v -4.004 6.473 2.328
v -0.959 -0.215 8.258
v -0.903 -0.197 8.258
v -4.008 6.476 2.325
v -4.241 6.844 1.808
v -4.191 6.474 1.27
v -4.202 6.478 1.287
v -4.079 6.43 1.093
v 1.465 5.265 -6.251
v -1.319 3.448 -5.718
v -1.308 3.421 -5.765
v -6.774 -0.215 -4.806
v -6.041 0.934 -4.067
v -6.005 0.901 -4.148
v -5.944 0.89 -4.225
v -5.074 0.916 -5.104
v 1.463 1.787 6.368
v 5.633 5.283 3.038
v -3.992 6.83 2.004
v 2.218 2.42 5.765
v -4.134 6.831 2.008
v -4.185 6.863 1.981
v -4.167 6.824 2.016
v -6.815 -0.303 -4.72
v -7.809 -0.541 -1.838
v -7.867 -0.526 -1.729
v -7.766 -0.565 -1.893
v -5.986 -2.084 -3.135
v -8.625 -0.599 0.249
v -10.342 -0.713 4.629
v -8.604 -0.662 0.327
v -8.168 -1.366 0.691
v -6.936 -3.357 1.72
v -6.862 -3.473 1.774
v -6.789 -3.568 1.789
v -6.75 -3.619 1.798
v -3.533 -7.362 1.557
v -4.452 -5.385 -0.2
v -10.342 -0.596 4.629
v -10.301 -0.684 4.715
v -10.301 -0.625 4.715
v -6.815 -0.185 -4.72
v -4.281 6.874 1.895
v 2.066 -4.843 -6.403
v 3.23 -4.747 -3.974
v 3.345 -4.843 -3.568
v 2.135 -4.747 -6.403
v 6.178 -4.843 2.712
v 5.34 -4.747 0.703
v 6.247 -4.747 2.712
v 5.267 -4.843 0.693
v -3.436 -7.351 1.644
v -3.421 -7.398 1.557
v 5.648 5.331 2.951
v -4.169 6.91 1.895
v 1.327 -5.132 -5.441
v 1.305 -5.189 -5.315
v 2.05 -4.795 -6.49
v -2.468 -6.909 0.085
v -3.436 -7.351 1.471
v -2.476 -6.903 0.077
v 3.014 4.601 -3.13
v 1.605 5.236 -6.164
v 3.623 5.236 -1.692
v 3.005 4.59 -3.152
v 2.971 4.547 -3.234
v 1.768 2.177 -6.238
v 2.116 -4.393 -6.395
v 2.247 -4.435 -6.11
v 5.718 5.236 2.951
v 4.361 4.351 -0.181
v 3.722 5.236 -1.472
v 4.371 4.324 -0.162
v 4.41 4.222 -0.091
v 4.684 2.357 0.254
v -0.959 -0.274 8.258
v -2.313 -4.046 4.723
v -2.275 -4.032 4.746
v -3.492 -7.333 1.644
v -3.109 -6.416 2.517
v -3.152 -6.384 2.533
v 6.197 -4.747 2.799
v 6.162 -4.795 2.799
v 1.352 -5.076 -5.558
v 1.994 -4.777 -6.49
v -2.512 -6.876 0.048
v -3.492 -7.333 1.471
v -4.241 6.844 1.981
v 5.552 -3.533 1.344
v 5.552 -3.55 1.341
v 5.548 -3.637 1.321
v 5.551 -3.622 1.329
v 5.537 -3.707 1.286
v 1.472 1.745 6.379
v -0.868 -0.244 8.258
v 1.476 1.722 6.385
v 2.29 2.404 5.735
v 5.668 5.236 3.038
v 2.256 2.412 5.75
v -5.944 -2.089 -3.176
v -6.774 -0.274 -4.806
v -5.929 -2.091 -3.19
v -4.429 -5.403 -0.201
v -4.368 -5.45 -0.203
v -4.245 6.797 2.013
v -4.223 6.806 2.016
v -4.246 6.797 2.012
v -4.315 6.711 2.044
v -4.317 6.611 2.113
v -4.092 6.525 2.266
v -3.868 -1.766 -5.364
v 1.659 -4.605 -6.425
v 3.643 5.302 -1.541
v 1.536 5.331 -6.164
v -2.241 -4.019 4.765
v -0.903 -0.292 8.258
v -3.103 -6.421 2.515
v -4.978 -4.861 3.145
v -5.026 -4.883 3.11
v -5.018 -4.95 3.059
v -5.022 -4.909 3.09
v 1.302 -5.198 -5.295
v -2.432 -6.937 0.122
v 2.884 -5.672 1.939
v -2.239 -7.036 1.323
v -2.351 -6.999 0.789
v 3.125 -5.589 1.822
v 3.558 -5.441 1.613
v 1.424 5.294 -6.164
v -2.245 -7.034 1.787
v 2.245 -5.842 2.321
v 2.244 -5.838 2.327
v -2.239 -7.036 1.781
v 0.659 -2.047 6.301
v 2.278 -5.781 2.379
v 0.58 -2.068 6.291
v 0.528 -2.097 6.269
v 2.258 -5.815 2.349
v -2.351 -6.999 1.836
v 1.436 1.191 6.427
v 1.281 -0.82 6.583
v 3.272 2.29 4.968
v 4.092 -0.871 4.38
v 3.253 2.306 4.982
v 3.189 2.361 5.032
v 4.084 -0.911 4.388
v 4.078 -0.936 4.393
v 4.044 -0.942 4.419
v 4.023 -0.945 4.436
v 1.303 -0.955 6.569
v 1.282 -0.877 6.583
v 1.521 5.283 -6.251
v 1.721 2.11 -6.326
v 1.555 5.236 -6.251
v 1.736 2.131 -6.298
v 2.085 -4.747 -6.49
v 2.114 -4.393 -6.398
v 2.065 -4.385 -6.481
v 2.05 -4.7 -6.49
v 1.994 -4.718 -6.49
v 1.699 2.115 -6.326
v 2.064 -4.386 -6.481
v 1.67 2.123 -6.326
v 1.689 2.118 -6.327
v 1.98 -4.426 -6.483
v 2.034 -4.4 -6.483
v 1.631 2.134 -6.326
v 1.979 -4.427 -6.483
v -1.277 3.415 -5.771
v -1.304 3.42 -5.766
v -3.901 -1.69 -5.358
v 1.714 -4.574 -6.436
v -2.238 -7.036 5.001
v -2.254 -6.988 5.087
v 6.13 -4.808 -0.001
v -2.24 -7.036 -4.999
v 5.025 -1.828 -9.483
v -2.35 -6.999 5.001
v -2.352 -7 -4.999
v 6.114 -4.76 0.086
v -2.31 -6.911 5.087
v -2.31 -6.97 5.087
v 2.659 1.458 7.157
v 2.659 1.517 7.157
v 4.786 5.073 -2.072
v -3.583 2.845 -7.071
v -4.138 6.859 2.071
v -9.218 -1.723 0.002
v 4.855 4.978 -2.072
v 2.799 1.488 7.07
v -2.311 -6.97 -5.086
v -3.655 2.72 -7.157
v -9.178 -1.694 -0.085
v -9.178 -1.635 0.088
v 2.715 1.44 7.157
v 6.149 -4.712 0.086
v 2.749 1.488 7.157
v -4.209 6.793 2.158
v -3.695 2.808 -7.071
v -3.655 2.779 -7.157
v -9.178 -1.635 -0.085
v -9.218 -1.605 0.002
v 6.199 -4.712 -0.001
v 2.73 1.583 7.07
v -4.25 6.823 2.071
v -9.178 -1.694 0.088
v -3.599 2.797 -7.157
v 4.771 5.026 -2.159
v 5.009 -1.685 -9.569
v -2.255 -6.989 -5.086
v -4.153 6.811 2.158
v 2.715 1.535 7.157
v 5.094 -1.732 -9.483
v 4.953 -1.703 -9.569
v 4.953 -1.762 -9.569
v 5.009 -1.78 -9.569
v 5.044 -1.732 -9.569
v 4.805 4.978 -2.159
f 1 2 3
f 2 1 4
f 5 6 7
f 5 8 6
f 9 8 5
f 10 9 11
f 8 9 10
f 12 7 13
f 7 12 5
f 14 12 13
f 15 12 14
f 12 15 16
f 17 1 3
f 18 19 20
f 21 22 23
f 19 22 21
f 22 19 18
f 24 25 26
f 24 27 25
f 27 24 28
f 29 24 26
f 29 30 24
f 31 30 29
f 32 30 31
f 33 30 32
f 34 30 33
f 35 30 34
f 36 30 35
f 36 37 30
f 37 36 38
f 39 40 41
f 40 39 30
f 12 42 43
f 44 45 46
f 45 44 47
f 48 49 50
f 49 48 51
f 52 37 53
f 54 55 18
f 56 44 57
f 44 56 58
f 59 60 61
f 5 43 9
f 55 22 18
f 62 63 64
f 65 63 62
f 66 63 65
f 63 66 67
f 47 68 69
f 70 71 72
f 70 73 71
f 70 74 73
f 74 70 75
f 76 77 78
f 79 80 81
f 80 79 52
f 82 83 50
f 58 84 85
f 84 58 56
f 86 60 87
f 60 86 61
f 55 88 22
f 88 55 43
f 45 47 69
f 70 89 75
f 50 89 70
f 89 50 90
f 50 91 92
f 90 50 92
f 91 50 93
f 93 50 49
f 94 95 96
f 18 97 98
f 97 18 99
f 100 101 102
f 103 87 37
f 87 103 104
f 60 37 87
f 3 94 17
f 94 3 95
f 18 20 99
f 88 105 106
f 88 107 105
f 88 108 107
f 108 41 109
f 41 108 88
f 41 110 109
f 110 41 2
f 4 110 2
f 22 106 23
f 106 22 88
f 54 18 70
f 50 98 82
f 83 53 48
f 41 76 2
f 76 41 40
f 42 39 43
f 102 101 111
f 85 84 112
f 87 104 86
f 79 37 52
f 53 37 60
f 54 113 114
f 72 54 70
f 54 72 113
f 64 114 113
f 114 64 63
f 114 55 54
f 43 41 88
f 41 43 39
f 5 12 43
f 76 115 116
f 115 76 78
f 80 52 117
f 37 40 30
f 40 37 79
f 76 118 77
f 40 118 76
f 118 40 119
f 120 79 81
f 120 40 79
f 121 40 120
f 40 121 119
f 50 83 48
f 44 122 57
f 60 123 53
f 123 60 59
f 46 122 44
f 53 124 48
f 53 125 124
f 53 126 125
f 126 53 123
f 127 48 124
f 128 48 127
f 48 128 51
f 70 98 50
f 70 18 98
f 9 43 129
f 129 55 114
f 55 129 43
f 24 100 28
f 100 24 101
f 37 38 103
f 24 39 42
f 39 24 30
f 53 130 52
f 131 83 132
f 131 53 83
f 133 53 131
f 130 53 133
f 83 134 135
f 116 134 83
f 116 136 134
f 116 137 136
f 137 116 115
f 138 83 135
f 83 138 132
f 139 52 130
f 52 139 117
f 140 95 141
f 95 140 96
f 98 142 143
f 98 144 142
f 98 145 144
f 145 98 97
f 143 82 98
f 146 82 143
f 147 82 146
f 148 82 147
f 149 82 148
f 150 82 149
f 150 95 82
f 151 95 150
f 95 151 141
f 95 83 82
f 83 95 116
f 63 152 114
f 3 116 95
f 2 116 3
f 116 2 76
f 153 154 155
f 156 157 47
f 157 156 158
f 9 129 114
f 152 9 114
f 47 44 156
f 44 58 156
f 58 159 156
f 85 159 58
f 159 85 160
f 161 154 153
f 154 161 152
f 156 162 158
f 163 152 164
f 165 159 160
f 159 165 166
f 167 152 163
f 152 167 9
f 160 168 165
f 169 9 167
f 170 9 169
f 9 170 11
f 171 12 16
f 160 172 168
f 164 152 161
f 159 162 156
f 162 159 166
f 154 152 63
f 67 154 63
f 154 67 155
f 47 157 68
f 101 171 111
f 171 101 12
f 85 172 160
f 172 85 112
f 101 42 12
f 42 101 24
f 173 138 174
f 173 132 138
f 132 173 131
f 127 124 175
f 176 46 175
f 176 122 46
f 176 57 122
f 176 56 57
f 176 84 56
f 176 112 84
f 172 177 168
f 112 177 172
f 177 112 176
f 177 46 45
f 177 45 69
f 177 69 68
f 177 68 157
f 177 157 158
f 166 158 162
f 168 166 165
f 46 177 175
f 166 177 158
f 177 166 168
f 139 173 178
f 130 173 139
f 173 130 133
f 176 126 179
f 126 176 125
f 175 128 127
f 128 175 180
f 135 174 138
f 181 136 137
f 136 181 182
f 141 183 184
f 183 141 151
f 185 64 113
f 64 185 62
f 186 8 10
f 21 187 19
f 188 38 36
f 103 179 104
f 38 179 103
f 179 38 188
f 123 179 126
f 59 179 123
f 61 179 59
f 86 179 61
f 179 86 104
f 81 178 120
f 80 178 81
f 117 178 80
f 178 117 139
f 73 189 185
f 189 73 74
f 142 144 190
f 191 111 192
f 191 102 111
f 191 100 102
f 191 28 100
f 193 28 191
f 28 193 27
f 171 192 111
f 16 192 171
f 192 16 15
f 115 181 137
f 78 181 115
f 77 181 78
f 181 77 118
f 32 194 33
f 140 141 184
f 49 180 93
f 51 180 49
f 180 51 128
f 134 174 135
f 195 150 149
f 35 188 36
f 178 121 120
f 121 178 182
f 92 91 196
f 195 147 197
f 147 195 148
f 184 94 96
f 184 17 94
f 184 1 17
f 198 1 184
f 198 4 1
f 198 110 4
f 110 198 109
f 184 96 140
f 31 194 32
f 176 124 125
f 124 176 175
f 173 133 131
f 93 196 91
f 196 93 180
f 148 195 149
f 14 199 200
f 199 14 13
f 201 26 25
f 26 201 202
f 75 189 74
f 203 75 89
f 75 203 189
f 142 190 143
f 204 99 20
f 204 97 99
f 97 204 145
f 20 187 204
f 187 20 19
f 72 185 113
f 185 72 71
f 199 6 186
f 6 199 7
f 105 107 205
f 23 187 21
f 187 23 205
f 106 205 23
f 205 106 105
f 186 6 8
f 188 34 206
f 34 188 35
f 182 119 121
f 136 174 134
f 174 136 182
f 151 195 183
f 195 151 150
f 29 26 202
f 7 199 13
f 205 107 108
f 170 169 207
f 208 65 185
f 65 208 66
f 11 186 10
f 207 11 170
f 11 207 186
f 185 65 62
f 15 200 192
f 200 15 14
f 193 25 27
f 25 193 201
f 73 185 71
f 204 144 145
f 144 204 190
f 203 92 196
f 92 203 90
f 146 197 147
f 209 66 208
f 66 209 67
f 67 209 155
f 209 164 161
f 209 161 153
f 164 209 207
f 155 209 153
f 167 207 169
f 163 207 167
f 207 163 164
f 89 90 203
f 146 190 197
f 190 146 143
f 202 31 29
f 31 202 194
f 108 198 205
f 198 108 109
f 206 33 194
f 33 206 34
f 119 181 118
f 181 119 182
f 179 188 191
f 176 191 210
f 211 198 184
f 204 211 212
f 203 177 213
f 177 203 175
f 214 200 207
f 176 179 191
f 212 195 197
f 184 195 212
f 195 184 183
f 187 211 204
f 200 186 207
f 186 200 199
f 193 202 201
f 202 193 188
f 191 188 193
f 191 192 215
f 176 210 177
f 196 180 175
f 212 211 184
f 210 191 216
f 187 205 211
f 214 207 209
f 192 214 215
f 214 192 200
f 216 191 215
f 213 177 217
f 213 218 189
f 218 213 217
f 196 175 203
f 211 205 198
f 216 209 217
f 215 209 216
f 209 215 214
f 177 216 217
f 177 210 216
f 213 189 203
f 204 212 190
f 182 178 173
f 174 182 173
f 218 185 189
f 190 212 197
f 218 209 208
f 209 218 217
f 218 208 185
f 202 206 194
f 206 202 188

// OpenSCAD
// Auto-generated OpenSCAD file

    inner_points = 10*[[0.47553456087715823, 0.4978078842969692, -0.2072352496078125], [-0.22709237834801976, -0.6940962000115061, -0.4999467766849563], [-0.36142103174737733, 0.2749515102768153, -0.7070755966518479], [0.6098632142765158, -0.47123982599135217, -0.00010642964092089091], [-0.41688364699083813, 0.6763916464639828, 0.20712881996862775], [-0.9137159203613099, -0.16641181407448244, 0.00015051424090967158], [0.2699180298323196, 0.14875469252611018, 0.7070315120518591], [-0.22691424353815204, -0.694048768012355, 0.500053206324141], [0.4993618307547157, -0.17324932327067738, -0.948257843987832]];

    outer_points = 10*[[-0.42003278146638656, 0.681501101519495, 0.18948721966919727], [-0.3451825718394467, -0.7303265261001592, 0.15572043112390738], [-0.09183323192223902, -0.024412712290332116, 0.8171581072778895], [-0.6733821213835942, -0.024412712290332116, -0.4719504564847848], [0.5617527129175098, 0.5235691569685188, 0.2951032407441999], [0.6146798037179536, -0.47474373238785456, 0.2712265155849332], [0.15053554958787962, 0.5235691569685188, -0.6164341663780378], [0.2034626403883234, -0.47474373238785456, -0.6403108915373046], [-1.0260745241448967, -0.06546983679345328, 0.4628877014666302]];

    // Convex hull for inner set (I)
    module inner_hull() {
        hull() {
            for (p = inner_points) {
                translate(p) sphere(r=0.1);
            }
        }
    }

    // Convex hull for outer set (O) minus inner hull (O \ I)
    module outer_minus_inner() {
        difference() {
            hull() {
                for (p = outer_points) {
                    translate(p) sphere(r=0.1);
                }
            }
            inner_hull(); // Subtract inner hull
        }
    }

    // Convex hull for outer set (O) minus all translated inner hulls
    module outer_minus_AllTranslationInner() {
        difference() {
            hull() {
                for (p = outer_points) {
                    translate(p) sphere(r=0.1);
                }
            }
            hull() {
                translate([0,0,50]) inner_hull();
                translate([0,0,-50]) inner_hull();
            }; // Subtract translated inner hulls
        }
    }

    // Difference between outer_minus_inner and outer_minus_AllTranslationInner
    module outer_minus_inner_diff() {
        difference() {
            // Outer minus inner
            difference() {
                hull() {
                    for (p = outer_points) {
                        translate(p) sphere(r=0.1);
                    }
                }
                inner_hull();
            }

            // Subtract Outer minus AllTranslationInner
            difference() {
                hull() {
                    for (p = outer_points) {
                        translate(p) sphere(r=0.1);
                    }
                }
                hull() {
                    translate([0,0,50]) inner_hull();
                    translate([0,0,-50]) inner_hull();
                };
            }
        }
    }

    // Rendering all with colors applied
    color([1, 0, 0, 0.5]) inner_hull(); // Transparent red
    color([0, 1, 0, 1]) outer_minus_AllTranslationInner(); // Opaque green
    color([1, 1, 0, 1]) outer_minus_inner_diff(); // Opaque yellow
    
